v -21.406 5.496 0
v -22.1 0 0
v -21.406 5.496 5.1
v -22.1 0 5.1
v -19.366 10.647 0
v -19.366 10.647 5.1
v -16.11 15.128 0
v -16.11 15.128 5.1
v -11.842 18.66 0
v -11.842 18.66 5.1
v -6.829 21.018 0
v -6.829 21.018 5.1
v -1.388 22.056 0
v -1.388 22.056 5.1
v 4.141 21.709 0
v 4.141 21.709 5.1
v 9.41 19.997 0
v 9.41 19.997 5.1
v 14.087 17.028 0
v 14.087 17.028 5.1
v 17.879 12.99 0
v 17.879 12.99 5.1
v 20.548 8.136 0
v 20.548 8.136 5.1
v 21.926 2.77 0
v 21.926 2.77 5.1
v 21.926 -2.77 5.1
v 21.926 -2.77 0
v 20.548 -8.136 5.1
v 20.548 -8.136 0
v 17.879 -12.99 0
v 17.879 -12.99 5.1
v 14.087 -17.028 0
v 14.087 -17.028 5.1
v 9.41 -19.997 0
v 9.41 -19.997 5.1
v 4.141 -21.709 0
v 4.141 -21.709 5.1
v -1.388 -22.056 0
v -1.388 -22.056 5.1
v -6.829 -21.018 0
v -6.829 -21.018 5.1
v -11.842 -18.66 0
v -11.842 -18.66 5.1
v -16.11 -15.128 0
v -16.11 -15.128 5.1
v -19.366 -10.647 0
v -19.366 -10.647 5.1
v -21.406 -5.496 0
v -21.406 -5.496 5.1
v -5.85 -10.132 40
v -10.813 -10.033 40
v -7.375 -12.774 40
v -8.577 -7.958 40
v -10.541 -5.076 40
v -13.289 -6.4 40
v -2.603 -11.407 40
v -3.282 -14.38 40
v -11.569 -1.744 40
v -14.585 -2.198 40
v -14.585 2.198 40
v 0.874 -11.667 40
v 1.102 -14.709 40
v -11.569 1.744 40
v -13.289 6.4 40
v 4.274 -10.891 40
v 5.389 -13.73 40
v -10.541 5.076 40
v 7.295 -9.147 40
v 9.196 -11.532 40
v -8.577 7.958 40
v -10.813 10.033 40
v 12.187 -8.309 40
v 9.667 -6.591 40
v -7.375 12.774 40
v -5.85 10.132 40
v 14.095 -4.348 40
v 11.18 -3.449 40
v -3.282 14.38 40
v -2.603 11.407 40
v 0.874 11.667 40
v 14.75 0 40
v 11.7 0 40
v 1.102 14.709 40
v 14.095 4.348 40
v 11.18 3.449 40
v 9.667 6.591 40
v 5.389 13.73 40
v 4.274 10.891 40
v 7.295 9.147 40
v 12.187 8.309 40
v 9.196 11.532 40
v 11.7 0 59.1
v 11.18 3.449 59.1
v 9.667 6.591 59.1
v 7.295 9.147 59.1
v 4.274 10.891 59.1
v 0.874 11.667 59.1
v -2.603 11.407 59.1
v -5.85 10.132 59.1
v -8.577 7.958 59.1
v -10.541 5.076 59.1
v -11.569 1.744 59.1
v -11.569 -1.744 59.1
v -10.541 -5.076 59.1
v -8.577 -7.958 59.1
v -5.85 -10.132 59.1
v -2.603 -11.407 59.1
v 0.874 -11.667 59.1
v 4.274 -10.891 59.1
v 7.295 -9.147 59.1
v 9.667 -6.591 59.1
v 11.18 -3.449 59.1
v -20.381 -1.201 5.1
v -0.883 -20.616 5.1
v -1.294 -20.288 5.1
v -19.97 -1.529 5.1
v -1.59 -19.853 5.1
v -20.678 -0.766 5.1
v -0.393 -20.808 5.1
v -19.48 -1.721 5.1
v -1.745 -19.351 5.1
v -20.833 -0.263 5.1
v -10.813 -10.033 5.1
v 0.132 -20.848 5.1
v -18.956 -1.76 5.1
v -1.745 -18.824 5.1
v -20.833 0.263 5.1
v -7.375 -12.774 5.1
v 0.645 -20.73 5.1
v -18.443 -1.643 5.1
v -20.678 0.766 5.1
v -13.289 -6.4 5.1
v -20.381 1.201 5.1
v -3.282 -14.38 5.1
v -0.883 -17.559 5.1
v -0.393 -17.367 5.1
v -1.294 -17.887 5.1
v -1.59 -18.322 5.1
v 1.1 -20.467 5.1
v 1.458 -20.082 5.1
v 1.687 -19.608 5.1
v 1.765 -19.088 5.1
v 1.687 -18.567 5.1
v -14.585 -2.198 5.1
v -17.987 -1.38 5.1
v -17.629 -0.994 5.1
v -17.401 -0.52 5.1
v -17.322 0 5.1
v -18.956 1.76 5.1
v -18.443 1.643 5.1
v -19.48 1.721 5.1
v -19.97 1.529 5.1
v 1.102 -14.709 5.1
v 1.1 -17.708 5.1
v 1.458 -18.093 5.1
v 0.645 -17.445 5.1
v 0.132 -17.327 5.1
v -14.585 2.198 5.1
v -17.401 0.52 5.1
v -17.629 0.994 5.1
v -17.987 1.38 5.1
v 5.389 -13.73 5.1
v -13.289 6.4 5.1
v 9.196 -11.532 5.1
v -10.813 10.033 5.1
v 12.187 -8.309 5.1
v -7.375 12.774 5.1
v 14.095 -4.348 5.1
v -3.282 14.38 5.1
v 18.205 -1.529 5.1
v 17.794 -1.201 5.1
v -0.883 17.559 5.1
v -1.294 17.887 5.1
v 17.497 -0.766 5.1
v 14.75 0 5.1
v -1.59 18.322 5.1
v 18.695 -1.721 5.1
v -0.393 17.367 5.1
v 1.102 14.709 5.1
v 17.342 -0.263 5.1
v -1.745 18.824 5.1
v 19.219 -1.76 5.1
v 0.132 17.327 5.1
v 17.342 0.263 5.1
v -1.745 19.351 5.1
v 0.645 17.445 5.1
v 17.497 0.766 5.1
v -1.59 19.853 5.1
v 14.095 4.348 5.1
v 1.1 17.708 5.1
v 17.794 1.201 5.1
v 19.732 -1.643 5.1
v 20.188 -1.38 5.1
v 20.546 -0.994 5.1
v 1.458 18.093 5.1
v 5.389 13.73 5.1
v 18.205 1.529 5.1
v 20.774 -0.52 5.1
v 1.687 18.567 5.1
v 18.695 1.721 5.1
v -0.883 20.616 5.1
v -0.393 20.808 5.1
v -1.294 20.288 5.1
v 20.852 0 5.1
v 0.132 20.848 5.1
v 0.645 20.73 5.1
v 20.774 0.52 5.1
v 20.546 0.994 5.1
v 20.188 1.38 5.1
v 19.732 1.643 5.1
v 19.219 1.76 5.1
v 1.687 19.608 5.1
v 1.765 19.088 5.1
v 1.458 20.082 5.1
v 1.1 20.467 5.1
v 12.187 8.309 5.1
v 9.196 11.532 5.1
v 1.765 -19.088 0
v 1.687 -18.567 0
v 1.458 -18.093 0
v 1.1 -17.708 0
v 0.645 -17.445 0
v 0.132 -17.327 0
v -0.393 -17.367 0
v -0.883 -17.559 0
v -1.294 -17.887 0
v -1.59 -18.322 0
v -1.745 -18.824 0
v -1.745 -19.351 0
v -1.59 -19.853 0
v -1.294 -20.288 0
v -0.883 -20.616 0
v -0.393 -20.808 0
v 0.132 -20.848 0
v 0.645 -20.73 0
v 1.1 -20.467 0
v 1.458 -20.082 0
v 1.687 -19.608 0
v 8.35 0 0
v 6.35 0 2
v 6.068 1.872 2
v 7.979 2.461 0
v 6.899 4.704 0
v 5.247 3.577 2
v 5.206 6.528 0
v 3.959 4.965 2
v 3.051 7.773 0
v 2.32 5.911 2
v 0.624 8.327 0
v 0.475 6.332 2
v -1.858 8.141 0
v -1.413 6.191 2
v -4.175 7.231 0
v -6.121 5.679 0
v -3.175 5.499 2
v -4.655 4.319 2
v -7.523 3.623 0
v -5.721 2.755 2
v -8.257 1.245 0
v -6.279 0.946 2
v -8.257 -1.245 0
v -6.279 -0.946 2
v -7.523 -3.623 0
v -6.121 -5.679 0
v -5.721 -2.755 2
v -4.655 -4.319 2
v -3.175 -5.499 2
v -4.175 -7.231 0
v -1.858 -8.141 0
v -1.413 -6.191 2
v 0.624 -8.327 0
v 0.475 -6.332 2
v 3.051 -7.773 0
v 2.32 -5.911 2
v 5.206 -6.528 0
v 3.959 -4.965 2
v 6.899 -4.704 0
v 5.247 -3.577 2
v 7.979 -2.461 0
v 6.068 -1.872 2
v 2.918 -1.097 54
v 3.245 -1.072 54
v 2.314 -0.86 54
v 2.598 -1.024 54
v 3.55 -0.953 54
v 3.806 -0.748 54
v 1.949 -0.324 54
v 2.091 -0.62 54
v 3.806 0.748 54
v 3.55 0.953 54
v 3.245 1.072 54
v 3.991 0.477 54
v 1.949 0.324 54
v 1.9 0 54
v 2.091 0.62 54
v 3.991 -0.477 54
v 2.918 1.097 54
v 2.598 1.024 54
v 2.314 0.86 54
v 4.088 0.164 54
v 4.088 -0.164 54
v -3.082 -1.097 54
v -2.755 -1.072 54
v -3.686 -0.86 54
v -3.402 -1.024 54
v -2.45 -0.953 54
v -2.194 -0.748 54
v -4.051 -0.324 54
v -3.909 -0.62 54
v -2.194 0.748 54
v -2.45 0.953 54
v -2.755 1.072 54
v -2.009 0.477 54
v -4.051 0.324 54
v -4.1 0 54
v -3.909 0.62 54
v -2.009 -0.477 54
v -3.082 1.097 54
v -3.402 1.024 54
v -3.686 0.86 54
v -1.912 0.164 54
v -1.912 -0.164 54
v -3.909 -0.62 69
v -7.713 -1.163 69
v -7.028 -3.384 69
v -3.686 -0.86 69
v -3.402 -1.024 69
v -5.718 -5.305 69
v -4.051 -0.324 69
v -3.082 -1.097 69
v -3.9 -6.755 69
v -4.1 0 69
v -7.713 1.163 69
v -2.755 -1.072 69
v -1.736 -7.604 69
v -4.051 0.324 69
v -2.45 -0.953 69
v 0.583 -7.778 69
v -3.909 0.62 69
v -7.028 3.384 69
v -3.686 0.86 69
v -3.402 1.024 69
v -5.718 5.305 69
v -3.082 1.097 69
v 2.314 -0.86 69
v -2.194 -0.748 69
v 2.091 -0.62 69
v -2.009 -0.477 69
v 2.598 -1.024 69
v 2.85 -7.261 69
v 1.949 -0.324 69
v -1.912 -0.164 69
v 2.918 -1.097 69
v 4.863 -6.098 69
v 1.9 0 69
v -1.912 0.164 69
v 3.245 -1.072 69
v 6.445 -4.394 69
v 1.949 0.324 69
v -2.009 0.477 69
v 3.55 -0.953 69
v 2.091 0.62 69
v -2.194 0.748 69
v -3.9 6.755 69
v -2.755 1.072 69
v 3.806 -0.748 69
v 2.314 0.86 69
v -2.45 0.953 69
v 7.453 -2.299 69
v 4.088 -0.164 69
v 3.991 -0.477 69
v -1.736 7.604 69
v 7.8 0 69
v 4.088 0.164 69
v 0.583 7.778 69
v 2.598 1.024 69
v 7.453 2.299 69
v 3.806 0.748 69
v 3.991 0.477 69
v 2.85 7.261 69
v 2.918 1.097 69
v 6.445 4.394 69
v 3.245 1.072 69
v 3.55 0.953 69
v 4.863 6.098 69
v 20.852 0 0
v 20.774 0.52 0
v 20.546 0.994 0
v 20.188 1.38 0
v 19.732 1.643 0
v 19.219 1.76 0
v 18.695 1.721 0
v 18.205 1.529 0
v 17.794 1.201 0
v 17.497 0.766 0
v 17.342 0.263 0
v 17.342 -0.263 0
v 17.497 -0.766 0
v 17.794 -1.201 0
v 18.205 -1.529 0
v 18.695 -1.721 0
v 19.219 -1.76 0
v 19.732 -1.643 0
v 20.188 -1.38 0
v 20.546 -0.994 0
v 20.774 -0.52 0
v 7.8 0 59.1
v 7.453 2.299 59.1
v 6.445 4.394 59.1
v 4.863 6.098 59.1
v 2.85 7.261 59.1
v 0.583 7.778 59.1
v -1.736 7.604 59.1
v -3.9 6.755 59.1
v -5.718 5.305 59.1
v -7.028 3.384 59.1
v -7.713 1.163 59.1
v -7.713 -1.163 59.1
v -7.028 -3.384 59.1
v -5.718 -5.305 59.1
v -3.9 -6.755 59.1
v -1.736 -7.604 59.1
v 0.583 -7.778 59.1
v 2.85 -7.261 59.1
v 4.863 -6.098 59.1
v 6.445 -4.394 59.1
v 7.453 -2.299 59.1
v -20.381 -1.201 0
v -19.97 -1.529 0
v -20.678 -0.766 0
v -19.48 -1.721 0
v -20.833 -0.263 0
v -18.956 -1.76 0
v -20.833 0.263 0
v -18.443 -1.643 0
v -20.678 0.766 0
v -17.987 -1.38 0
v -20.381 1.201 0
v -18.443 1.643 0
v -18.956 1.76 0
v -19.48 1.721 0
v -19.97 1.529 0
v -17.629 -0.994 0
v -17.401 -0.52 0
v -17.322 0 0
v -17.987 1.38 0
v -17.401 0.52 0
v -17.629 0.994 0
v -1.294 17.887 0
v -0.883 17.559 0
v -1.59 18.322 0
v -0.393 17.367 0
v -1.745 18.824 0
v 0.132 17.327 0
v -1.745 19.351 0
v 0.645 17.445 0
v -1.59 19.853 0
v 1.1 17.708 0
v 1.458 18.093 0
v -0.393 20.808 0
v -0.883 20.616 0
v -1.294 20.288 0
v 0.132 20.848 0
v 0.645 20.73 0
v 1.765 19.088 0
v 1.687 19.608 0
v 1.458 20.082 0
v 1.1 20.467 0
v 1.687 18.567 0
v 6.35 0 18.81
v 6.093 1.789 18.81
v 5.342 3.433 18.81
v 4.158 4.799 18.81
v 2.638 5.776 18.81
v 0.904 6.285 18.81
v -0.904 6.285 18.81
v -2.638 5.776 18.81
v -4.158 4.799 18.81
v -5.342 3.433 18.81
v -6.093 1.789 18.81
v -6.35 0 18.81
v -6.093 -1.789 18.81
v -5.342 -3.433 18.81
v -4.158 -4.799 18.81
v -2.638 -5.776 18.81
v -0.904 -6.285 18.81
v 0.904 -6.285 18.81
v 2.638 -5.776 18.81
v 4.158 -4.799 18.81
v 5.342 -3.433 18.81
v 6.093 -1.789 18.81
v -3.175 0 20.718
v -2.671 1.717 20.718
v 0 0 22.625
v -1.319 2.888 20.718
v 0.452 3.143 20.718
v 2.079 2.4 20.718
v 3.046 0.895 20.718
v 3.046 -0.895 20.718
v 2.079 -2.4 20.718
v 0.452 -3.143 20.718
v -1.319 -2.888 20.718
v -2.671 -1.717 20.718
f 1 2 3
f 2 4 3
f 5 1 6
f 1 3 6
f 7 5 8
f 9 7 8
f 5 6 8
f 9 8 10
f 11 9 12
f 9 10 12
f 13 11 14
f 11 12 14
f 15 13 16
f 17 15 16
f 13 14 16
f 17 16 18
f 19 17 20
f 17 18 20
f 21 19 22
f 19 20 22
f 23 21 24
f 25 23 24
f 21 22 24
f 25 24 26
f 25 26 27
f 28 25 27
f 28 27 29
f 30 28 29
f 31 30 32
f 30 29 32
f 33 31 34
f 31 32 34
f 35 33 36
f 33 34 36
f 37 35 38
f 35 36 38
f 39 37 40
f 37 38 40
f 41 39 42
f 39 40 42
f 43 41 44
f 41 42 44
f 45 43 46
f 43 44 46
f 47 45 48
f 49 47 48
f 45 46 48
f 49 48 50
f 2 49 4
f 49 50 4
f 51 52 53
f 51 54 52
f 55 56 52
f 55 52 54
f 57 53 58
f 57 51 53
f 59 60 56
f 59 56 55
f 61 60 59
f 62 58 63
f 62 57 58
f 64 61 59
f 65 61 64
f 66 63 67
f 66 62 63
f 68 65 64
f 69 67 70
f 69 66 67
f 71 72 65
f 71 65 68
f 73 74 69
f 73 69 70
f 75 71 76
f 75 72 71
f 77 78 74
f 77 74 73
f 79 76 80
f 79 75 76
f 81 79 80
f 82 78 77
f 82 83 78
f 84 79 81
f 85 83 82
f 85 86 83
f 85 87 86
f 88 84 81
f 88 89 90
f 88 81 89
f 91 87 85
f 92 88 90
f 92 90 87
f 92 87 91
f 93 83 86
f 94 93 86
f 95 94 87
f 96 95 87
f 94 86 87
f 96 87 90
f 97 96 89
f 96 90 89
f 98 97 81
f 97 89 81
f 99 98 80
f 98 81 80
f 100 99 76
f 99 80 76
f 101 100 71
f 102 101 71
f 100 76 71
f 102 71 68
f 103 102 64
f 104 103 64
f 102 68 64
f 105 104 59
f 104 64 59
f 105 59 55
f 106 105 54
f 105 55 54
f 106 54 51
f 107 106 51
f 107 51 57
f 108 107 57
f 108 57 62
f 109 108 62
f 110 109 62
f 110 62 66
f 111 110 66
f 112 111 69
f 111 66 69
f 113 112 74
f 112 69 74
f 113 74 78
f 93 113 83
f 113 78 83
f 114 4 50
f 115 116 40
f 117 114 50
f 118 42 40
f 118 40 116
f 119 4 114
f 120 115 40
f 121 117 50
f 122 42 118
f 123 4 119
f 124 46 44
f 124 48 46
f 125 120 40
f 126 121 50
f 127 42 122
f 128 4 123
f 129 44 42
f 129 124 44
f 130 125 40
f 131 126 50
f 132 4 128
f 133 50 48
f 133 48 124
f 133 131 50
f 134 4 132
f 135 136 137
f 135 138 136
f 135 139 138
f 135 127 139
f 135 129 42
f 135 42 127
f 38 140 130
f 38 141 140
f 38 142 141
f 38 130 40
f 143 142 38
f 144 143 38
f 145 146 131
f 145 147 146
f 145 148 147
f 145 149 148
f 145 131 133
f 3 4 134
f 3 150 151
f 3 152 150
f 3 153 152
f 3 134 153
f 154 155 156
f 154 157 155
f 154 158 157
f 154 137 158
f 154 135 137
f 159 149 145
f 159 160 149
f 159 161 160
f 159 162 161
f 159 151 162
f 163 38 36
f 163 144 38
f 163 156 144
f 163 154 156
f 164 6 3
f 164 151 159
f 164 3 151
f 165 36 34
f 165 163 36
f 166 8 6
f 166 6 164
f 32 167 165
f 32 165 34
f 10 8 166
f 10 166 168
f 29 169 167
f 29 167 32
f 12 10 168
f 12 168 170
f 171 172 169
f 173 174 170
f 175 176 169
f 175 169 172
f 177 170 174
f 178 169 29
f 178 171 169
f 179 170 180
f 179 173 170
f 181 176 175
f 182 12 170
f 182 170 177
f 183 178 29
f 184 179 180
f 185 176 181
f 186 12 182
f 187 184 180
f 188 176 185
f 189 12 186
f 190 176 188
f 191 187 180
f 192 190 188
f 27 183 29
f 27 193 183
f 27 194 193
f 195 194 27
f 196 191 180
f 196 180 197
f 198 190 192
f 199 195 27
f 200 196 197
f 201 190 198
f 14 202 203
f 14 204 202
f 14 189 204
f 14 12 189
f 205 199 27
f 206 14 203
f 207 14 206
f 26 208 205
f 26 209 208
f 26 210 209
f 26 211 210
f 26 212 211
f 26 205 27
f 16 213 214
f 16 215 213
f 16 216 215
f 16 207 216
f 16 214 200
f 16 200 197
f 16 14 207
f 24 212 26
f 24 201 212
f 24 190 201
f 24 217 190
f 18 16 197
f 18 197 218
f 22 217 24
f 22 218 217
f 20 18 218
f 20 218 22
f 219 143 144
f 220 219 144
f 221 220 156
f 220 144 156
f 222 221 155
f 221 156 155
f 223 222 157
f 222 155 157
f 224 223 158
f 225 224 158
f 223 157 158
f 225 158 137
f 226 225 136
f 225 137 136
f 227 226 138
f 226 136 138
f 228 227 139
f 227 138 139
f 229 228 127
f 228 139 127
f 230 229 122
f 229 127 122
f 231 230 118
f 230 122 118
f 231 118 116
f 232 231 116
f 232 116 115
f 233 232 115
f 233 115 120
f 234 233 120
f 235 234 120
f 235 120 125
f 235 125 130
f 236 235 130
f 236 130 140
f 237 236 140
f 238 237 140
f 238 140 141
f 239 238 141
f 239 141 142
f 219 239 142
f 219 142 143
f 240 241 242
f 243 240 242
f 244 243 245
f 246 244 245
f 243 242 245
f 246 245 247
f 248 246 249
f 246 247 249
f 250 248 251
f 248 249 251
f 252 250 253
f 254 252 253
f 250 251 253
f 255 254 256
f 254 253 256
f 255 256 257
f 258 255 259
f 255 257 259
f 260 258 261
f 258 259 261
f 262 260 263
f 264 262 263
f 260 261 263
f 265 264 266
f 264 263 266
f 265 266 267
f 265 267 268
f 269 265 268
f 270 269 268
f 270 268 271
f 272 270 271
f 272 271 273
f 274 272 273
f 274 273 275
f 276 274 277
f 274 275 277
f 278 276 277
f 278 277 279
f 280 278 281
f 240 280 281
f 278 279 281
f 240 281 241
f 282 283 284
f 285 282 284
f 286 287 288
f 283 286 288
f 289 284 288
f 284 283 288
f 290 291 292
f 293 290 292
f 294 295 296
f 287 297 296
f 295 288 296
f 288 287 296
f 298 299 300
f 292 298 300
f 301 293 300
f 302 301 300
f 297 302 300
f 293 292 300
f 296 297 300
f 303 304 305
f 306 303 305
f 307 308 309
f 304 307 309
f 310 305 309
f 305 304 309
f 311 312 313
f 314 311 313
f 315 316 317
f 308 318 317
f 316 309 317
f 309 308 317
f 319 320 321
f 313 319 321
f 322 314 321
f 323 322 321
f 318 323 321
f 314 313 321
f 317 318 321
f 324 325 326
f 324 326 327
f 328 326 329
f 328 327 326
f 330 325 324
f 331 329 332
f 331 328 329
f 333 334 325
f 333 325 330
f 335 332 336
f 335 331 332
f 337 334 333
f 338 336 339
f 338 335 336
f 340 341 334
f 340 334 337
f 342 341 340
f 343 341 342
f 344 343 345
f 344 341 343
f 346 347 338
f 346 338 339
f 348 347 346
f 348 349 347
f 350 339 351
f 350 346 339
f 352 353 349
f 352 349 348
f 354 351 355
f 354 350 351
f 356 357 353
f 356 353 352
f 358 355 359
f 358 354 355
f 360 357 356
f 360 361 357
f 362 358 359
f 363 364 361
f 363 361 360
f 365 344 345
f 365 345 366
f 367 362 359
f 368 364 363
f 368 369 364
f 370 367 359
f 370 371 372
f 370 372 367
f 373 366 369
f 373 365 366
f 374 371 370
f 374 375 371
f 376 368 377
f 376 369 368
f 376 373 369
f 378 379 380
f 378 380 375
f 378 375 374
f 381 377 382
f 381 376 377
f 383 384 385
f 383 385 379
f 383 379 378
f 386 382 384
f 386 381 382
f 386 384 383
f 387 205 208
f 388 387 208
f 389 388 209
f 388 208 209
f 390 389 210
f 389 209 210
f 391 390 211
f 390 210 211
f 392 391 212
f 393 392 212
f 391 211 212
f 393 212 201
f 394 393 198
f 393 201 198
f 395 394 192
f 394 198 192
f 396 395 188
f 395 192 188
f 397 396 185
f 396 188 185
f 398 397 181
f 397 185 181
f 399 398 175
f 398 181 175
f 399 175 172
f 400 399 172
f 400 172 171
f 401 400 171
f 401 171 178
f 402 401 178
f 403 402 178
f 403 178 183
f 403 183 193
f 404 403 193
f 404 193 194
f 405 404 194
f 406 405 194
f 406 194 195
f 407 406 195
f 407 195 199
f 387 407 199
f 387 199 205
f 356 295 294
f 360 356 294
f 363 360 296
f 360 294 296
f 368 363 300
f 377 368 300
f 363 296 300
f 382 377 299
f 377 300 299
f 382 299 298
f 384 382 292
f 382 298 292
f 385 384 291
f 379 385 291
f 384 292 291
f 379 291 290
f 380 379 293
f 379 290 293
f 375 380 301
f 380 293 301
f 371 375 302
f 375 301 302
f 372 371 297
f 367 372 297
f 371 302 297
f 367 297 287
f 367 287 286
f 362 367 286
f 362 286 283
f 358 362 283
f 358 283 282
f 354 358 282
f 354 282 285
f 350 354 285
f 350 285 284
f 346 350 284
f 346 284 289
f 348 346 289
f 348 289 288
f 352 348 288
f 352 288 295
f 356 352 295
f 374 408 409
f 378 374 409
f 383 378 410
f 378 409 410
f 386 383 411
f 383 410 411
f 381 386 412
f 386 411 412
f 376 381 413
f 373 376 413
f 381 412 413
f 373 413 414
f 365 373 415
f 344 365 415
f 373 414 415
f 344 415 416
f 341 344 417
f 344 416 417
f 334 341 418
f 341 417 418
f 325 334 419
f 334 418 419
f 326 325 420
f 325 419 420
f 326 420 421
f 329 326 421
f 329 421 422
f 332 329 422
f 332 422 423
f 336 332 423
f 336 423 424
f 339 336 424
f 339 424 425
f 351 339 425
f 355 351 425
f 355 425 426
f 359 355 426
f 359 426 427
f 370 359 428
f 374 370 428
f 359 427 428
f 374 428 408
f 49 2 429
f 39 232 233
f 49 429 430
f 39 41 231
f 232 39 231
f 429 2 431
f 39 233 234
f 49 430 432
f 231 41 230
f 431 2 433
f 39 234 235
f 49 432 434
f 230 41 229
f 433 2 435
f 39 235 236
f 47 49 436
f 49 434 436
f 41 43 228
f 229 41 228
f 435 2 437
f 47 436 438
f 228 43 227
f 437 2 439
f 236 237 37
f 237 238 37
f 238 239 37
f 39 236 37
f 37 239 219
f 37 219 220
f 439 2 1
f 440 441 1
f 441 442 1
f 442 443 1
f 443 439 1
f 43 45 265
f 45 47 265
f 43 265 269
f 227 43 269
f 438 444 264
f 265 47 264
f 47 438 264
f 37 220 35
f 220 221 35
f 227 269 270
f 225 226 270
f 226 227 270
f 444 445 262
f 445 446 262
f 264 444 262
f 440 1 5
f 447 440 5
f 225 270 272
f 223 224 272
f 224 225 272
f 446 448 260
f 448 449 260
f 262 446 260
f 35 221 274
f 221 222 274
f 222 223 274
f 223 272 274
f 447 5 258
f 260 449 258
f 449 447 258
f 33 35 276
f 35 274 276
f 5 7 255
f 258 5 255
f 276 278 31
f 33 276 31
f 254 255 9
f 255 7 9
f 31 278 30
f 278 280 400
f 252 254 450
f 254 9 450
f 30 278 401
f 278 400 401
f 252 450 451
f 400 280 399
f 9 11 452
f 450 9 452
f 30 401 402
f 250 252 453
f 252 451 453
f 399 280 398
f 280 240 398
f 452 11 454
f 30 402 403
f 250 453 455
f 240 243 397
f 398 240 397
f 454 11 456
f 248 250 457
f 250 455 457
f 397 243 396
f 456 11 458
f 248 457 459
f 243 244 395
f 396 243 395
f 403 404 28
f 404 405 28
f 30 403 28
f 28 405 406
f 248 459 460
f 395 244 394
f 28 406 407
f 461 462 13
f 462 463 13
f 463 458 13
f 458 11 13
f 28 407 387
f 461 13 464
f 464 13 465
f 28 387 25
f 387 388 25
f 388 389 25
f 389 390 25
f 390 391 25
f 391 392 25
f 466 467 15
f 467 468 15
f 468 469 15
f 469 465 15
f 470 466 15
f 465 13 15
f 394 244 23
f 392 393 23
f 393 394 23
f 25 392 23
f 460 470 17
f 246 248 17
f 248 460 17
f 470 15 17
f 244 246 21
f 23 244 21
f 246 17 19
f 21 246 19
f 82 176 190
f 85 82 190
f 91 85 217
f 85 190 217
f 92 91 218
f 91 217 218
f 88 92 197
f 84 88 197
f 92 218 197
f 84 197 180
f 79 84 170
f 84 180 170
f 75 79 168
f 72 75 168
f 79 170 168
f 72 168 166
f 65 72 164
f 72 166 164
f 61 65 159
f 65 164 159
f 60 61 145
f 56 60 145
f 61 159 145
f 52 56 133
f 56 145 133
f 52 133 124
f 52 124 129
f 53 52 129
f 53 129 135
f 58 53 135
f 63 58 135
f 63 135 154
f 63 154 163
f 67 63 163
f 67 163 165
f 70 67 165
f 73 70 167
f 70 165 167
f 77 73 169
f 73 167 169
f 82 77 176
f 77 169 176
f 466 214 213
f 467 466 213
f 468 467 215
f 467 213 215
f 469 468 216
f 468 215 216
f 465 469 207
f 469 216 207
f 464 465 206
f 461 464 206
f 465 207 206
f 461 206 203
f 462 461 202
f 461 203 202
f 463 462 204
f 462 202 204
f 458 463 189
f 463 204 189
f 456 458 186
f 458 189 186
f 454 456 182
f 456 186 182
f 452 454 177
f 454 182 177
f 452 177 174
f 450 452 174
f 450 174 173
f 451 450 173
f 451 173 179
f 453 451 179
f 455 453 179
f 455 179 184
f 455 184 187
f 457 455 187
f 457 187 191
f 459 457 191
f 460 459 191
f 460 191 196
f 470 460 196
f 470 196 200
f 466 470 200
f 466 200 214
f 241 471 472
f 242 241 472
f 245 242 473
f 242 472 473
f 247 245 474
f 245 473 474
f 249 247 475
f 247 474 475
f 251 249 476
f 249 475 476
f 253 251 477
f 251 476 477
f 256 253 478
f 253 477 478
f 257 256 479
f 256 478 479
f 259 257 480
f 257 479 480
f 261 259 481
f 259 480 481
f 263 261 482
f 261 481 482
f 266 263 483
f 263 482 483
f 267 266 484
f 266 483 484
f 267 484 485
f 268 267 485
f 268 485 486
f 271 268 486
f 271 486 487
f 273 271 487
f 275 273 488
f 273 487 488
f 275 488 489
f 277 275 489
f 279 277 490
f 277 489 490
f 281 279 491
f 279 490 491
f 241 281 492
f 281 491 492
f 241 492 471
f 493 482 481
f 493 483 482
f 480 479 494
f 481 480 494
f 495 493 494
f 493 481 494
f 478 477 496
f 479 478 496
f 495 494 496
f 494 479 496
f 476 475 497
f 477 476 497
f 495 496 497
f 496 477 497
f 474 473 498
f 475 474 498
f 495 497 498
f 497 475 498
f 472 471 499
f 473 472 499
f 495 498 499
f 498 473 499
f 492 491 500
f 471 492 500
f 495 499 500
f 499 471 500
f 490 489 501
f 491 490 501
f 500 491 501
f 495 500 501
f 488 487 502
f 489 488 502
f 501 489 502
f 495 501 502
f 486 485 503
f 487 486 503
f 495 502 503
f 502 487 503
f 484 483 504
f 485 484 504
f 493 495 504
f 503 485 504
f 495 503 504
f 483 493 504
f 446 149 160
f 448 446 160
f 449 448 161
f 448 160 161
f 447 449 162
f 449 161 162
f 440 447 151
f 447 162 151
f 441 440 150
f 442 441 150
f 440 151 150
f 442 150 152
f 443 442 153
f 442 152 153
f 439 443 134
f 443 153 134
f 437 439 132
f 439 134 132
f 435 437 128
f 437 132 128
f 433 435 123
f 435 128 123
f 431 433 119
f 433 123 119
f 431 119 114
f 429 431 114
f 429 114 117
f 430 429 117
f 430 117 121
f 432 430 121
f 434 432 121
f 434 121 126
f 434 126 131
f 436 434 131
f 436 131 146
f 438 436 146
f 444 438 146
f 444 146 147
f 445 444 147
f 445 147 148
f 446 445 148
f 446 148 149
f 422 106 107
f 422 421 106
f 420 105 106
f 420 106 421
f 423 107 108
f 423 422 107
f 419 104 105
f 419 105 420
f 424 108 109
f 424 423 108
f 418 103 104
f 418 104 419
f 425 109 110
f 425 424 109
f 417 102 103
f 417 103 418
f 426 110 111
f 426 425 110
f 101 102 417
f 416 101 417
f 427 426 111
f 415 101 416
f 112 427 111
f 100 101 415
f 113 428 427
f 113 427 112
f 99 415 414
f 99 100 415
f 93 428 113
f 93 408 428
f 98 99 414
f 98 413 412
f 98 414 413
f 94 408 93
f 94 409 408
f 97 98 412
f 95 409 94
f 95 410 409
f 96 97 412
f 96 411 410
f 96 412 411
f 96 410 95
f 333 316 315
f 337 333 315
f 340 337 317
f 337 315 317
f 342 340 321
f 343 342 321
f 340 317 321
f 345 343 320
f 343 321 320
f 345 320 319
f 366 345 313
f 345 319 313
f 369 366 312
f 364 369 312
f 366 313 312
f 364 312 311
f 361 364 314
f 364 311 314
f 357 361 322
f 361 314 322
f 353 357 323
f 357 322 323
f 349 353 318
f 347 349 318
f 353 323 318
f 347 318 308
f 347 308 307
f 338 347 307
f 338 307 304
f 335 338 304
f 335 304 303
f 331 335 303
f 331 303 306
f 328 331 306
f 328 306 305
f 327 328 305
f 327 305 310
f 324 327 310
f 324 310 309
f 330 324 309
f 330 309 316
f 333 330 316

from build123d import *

# Parameters (mm, degrees)
SKETCH1_W                      = 22.1
SKETCH1_H                      = 5.1
SKETCH2_R                      = 14.75
BOSS_EXTRUDE1_DEPTH            = 34.9
SKETCH3_R                      = 11.7
BOSS_EXTRUDE2_DEPTH            = 19.1
SKETCH4_R                      = 7.8
BOSS_EXTRUDE3_DEPTH            = 9.9
M10_CLEARANCE_HOLE1_D          = 12.7
M10_CLEARANCE_HOLE1_DEPTH      = 18.81
M10_CLEARANCE_HOLE1_TIP        = 3.815464931
F_2_2_2_2_DIAMETER_HOLE1_D     = 2.2
F_2_2_2_2_DIAMETER_HOLE1_DEPTH = 15
M3_CLEARANCE_HOLE1_D           = 3.53
M3_CLEARANCE_HOLE1_DEPTH       = 69
CHAMFER1_SIZE                  = 2


with BuildPart() as part:
    # Sketch1 → Revolve1 (revolve)
    with BuildSketch(Plane.XZ, mode=Mode.PRIVATE) as revolve1_sk:
        with Locations((11.05, 2.55)):
            Rectangle(SKETCH1_W, SKETCH1_H)
    revolve(revolve1_sk.sketch.rotate(Axis((0, 0, 5.1), (0, 0, -1)), 180), axis=Axis((0, 0, 5.1), (0, 0, -1)))

    # Sketch2 → Boss-Extrude1 (add)
    with BuildSketch(Plane.XY.offset(5.1)):
        Circle(SKETCH2_R)
    extrude(amount=BOSS_EXTRUDE1_DEPTH)

    # Sketch3 → Boss-Extrude2 (add)
    with BuildSketch(Plane.XY.offset(40)):
        Circle(SKETCH3_R)
    extrude(amount=BOSS_EXTRUDE2_DEPTH)

    # Sketch4 → Boss-Extrude3 (add)
    with BuildSketch(Plane.XY.offset(59.1)):
        Circle(SKETCH4_R)
    extrude(amount=BOSS_EXTRUDE3_DEPTH)

    # M10 Clearance Hole1
    with Locations(Plane(origin=(0, 0, 0), x_dir=(-1, 0, 0), z_dir=(0, 0, -1))):
        with Locations((0, 0)):
            Hole(M10_CLEARANCE_HOLE1_D / 2, depth=M10_CLEARANCE_HOLE1_DEPTH)
            with Locations((0, 0, -(M10_CLEARANCE_HOLE1_DEPTH + M10_CLEARANCE_HOLE1_TIP / 2))):  # 118° drill point
                Cone(0, M10_CLEARANCE_HOLE1_D / 2, M10_CLEARANCE_HOLE1_TIP, mode=Mode.SUBTRACT)

    # Ø2.2 (2.2) Diameter Hole1
    with Locations(Plane.XY.offset(69)):
        with Locations((-3, 0), (3, 0)):
            Hole(F_2_2_2_2_DIAMETER_HOLE1_D / 2, depth=F_2_2_2_2_DIAMETER_HOLE1_DEPTH)

    # M3 Clearance Hole1
    with Locations(Plane(origin=(0, 0, 0), x_dir=(-1, 0, 0), z_dir=(0, 0, -1))):
        with Locations((0, 19.0875), (-19.0875, 0), (0, -19.0875), (19.0875, 0)):
            Hole(M3_CLEARANCE_HOLE1_D / 2, depth=M3_CLEARANCE_HOLE1_DEPTH)

    # Chamfer1
    chamfer1_edges = [part.edges().sort_by_distance(p)[0] for p in [
        (-6.35, 0, 0),
    ]]
    chamfer(chamfer1_edges, length=CHAMFER1_SIZE)


solid = part.part
